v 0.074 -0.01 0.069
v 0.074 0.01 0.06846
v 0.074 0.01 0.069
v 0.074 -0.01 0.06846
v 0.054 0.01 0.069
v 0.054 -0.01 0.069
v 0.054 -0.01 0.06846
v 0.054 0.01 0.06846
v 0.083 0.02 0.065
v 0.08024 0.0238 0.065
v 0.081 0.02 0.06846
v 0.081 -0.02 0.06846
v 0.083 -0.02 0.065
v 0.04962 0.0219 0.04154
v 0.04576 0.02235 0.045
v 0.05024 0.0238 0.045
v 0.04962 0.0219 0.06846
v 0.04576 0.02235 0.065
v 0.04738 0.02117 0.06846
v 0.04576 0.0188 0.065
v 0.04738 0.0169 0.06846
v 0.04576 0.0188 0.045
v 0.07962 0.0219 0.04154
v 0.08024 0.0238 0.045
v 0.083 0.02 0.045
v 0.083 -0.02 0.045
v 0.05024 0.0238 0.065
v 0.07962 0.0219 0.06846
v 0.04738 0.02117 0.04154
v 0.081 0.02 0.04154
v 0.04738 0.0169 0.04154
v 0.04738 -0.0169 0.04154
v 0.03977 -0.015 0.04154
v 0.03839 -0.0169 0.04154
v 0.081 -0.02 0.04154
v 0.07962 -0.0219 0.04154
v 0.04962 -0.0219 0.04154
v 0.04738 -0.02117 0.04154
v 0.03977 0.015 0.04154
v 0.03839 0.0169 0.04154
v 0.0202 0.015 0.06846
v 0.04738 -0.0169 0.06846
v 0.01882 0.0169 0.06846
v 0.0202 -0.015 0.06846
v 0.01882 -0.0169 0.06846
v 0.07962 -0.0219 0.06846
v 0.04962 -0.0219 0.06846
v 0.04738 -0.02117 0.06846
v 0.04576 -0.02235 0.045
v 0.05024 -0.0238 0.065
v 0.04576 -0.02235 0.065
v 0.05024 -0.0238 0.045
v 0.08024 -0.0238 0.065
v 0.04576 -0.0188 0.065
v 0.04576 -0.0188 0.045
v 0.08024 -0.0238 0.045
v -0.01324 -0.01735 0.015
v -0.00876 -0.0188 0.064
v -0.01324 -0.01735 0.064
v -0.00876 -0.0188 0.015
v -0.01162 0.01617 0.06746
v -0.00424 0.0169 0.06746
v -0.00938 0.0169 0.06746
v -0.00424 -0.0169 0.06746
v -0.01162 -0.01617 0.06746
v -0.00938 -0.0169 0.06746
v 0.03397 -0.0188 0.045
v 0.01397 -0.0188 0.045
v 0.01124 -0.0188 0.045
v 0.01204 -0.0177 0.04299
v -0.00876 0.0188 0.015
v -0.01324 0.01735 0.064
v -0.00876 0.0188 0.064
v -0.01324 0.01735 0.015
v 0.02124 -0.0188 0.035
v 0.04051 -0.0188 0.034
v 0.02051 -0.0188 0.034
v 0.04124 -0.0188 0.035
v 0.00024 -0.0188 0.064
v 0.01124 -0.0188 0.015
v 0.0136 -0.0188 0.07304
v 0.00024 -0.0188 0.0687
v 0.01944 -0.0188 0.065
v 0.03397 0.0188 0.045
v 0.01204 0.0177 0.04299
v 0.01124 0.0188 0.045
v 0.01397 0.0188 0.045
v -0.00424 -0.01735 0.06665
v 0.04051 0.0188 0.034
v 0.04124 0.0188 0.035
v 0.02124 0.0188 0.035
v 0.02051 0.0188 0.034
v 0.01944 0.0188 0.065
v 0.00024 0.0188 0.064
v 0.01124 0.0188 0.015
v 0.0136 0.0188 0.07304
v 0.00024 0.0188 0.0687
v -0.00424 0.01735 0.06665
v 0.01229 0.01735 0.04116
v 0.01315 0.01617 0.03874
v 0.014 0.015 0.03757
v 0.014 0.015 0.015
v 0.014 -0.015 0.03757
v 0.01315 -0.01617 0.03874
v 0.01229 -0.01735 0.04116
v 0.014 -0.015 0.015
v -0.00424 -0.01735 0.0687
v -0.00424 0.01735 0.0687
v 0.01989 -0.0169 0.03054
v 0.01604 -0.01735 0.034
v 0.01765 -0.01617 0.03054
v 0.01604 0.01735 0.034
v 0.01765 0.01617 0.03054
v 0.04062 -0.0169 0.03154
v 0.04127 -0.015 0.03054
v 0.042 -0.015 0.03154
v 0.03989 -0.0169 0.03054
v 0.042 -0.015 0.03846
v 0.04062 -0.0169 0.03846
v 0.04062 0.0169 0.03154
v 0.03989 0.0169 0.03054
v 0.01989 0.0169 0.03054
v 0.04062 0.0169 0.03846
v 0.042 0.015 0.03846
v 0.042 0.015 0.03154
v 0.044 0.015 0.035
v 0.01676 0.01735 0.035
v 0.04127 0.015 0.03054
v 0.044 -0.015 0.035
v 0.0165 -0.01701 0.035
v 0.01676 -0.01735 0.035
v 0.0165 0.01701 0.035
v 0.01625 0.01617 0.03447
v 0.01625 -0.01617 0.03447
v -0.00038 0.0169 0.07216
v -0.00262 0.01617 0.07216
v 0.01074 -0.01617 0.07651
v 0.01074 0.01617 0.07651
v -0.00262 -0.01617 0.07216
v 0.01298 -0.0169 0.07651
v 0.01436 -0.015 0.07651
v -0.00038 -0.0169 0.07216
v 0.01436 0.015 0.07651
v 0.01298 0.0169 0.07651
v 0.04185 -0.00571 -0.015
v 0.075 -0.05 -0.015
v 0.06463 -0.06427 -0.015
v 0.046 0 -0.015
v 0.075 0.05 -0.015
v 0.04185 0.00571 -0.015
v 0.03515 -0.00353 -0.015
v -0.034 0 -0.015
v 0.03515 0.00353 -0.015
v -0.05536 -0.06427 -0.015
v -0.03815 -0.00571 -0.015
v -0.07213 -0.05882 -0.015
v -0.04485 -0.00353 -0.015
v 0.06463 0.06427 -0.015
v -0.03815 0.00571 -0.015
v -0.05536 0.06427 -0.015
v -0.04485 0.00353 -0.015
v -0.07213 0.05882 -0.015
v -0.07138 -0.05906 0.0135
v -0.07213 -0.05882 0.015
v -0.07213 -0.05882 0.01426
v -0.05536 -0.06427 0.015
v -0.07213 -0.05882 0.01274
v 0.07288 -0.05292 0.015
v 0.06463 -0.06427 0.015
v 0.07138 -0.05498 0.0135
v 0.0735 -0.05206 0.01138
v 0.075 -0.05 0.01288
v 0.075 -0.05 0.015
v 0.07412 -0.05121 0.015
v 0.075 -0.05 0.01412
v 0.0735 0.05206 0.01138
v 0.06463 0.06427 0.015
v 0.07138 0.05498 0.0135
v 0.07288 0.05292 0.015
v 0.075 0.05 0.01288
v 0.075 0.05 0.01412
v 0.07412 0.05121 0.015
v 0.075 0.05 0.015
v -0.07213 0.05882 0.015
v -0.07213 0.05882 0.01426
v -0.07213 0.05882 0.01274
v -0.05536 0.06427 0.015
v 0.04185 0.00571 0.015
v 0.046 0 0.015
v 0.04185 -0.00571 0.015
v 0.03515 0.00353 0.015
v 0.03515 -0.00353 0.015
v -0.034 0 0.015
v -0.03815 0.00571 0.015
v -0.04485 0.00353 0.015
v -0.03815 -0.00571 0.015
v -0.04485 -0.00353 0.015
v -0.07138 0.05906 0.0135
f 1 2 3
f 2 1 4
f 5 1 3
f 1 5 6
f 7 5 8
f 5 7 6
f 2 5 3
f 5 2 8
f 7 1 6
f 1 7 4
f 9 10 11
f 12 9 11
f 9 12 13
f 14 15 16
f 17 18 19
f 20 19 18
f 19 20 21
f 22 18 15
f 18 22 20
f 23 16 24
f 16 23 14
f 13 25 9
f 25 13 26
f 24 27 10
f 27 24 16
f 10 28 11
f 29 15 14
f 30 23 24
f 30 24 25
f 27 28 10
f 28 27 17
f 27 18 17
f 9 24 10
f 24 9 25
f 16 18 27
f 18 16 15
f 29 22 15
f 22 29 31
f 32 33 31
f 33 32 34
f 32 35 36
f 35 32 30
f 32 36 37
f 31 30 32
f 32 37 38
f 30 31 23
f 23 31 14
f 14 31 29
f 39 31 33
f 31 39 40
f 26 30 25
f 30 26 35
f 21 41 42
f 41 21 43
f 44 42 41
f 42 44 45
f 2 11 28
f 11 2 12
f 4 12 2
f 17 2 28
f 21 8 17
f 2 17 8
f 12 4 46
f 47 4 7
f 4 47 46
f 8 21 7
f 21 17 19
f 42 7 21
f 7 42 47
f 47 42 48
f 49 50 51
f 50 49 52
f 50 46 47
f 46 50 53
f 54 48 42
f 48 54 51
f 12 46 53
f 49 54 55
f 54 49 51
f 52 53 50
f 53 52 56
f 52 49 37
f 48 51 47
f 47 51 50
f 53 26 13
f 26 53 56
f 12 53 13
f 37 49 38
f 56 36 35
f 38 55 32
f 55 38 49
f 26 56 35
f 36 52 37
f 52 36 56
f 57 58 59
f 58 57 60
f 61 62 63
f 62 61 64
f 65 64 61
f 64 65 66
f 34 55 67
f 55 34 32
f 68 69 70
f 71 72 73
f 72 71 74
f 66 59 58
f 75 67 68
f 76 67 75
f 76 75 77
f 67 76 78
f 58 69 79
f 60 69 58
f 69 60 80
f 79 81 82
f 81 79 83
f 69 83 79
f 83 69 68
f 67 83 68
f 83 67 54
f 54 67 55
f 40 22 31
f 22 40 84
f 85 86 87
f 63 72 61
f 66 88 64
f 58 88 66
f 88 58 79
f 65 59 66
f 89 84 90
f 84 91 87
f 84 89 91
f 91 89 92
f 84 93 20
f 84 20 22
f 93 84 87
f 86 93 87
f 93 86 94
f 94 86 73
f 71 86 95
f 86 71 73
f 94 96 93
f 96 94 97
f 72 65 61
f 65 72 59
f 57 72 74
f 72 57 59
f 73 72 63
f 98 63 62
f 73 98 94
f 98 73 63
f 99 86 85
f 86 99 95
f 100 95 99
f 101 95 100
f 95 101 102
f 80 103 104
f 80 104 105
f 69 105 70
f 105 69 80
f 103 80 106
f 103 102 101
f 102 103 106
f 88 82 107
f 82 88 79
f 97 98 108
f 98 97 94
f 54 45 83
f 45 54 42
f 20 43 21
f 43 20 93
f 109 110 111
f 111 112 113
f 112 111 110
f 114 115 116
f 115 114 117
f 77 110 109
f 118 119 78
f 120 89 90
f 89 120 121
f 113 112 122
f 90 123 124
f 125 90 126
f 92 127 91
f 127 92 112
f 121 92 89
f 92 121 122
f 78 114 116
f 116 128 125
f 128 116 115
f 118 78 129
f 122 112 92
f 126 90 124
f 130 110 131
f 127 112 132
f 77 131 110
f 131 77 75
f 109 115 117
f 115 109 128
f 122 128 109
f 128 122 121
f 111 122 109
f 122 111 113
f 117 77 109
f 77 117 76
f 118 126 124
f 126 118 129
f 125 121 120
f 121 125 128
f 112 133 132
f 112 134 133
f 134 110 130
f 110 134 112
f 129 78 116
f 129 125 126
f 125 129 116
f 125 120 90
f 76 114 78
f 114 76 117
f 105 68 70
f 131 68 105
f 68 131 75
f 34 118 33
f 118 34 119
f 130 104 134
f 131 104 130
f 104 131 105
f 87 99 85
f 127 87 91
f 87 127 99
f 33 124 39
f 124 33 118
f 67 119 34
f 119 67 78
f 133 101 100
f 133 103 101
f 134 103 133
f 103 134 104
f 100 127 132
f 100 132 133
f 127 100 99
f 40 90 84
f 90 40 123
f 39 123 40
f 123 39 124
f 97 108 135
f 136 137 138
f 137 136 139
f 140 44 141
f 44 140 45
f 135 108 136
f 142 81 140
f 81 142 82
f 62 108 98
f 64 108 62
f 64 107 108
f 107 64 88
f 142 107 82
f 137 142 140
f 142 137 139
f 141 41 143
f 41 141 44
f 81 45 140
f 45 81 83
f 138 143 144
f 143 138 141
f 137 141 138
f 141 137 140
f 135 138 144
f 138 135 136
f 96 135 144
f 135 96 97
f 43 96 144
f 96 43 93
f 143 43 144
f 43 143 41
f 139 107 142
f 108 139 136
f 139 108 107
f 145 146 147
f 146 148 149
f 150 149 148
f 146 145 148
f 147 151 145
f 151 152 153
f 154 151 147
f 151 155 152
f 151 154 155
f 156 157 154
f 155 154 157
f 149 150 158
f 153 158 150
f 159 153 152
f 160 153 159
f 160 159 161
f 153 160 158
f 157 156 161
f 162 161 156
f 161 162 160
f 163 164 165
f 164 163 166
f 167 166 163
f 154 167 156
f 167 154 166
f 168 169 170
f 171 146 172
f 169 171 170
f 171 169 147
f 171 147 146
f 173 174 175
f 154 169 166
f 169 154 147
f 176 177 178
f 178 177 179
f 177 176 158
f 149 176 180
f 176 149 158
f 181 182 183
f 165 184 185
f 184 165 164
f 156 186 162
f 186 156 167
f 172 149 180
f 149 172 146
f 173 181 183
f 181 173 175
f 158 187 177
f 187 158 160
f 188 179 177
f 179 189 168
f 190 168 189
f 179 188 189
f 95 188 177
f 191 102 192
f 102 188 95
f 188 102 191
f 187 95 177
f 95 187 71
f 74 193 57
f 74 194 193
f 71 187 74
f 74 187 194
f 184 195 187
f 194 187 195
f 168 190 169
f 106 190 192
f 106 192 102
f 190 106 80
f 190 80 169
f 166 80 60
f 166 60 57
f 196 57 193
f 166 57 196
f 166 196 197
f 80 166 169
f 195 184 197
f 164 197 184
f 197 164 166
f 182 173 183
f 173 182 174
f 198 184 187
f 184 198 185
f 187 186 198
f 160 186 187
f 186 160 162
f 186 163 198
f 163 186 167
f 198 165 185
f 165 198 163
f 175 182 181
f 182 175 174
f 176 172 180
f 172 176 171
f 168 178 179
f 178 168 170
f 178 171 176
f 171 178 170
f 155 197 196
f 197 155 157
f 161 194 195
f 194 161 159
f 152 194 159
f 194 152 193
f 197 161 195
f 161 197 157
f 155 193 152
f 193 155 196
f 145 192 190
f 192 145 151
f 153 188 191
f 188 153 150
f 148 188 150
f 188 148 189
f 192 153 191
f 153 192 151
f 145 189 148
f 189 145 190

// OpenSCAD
// Parameters
bbox_x = 0.15; //[0.075:0.3:0.001]
bbox_y = 0.13; //[0.065:0.26:0.001]
bbox_z = 0.08; //[0.04:0.16:0.001]
base_x = 0.15; //[0.075:0.3:0.001]
base_y = 0.13; //[0.065:0.26:0.001]
base_z = 0.03; //[0.015:0.06:0.001]
base_corner_r = 0.015; //[0.0075:0.03:0.0005]
arm_thk_z = 0.02; //[0.01:0.04:0.001]
arm_w = 0.03; //[0.015:0.06:0.001]
elbow_r = 0.03; //[0.015:0.06:0.001]
arm_leg1_len = 0.05; //[0.025:0.1:0.001]
arm_leg2_len = 0.05; //[0.025:0.1:0.001]
end_pad_x = 0.03; //[0.015:0.06:0.001]
end_pad_y = 0.04; //[0.02:0.08:0.001]
end_pad_z = 0.02; //[0.01:0.04:0.001]
boss1_x = 0.02; //[0.01:0.04:0.001]
boss1_y = 0.02; //[0.01:0.04:0.001]
boss1_z = 0.01; //[0.005:0.02:0.001]
boss2_x = 0.02; //[0.01:0.04:0.001]
boss2_y = 0.02; //[0.01:0.04:0.001]
boss2_z = 0.01; //[0.005:0.02:0.001]
overlap = 0.001; //[0.0005:0.002:0.0001]
fillet_r = 0.004; //[0.002:0.008:0.0005]
chamfer_depth = 0.003; //[0.001:0.006:0.0005]
mount_hole_r = 0.006; //[0.003:0.012:0.0005]
mount_hole_offset_x = 0.04; //[0.02:0.07:0.001]

// Base rounded rectangle
module base_block_rounded_rect() {
  hull() {
    translate([-base_x/2 + base_corner_r, base_y/2 - base_corner_r, 0])
      cylinder(r=base_corner_r, h=base_z, center=true);
    translate([base_x/2 - base_corner_r, base_y/2 - base_corner_r, 0])
      cylinder(r=base_corner_r, h=base_z, center=true);
    translate([-base_x/2 + base_corner_r, -base_y/2 + base_corner_r, 0])
      cylinder(r=base_corner_r, h=base_z, center=true);
    translate([base_x/2 - base_corner_r, -base_y/2 + base_corner_r, 0])
      cylinder(r=base_corner_r, h=base_z, center=true);
  }
}

// Cantilever arm with elbow
module cantilever_arm() {
  // Arm leg 1
  translate([0, 0, base_z/2 + arm_leg1_len/2 - overlap])
    cube([arm_thk_z, arm_w, arm_leg1_len], center=true);
  
  // Arm leg 2
  translate([arm_leg2_len/2 - overlap, 0, base_z/2 + arm_leg1_len - arm_thk_z/2])
    cube([arm_leg2_len, arm_w, arm_thk_z], center=true);
  
  // Elbow
  difference() {
    intersection() {
      translate([0, 0, base_z/2 + arm_leg1_len - elbow_r])
        rotate([90, 0, 0])
        cylinder(r=elbow_r + arm_thk_z/2, h=arm_w, center=true);
      translate([(elbow_r + arm_thk_z)/2 - overlap, 0, base_z/2 + arm_leg1_len - elbow_r + (elbow_r + arm_thk_z)/2 - overlap])
        cube([elbow_r + arm_thk_z, arm_w + 2*overlap, elbow_r + arm_thk_z], center=true);
    }
    translate([0, 0, base_z/2 + arm_leg1_len - elbow_r])
      rotate([90, 0, 0])
      cylinder(r=elbow_r - arm_thk_z/2, h=arm_w + 2*overlap, center=true);
  }
}

// End pad
module end_pad() {
  translate([arm_leg2_len - overlap + end_pad_x/2, 0, base_z/2 + arm_leg1_len - arm_thk_z/2])
    cube([end_pad_x, end_pad_y, end_pad_z], center=true);
}

// Bosses
module bosses() {
  // Boss near junction
  translate([0, 0, base_z/2 + boss1_z/2 - overlap])
    cube([boss1_x, boss1_y, boss1_z], center=true);
  
  // Boss near end pad
  translate([arm_leg2_len - overlap + end_pad_x/2, 0, base_z/2 + arm_leg1_len - arm_thk_z/2 + end_pad_z/2 - overlap])
    cube([boss2_x, boss2_y, boss2_z], center=true);
}

// Mounting holes
module mounting_holes() {
  translate([-mount_hole_offset_x, 0, 0])
    cylinder(r=mount_hole_r, h=base_z + 2*overlap, center=true);
  translate([mount_hole_offset_x, 0, 0])
    cylinder(r=mount_hole_r, h=base_z + 2*overlap, center=true);
}

// Chamfers
module chamfers() {
  translate([-base_x/2 + chamfer_depth/2, 0, base_z/2 - chamfer_depth/2])
    rotate([0, 45, 0])
    cube([chamfer_depth, base_y + 2*overlap, chamfer_depth], center=true);
  translate([base_x/2 - chamfer_depth/2, 0, base_z/2 - chamfer_depth/2])
    rotate([0, 45, 0])
    cube([chamfer_depth, base_y + 2*overlap, chamfer_depth], center=true);
}

// Final assembly
difference() {
  union() {
    base_block_rounded_rect();
    bosses();
    minkowski() {
      union() {
        cantilever_arm();
        end_pad();
      }
      sphere(r=fillet_r, center=true);
    }
  }
  chamfers();
  mounting_holes();
}
